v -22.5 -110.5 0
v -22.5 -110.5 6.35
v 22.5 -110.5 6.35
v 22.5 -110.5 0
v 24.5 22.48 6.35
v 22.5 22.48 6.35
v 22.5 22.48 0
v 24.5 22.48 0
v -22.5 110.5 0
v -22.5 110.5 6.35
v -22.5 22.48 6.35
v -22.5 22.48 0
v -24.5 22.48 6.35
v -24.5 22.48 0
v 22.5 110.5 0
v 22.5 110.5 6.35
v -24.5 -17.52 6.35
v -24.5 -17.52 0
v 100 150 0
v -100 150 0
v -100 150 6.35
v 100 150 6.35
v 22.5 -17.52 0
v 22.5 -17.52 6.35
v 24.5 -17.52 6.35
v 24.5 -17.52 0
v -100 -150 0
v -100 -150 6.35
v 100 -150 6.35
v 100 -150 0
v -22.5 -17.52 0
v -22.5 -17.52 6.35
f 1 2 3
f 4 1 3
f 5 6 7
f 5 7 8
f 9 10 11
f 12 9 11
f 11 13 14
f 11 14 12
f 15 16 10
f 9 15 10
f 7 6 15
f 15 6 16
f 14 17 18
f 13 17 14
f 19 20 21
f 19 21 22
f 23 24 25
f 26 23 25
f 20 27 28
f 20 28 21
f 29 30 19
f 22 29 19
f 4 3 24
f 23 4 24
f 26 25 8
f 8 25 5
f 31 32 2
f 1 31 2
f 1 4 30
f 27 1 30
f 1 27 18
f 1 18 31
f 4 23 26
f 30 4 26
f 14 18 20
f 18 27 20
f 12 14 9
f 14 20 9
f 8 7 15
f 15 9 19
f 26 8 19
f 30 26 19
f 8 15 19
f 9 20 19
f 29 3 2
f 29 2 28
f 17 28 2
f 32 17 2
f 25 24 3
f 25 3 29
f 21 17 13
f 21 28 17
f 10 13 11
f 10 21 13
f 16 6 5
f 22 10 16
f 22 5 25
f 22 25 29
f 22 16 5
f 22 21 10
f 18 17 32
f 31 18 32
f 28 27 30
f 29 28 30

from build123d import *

# Parameters (mm, degrees)
F0_W     = 200
F0_H     = 300
F1_DEPTH = 6.35
F2_W     = 2
F2_H     = 40
F3_DEPTH = 25.4


# Not quite as in the source:
# - a length typed as a fraction of an inch, garbled in the dataset ("3 / 203.2 mm" for 3/8 in), is restored


with BuildPart() as f1:
    # F0 (on Top) → F1 (new body)
    with BuildSketch(Plane.XY):
        Rectangle(F0_W, F0_H)
    extrude(amount=F1_DEPTH)

    # F2 (on face) → F3 (cut)
    with BuildSketch(Plane.XY.offset(6.35)):
        Polygon((22.5, 22.48), (22.5, 110.5), (-22.5, 110.5), (-22.5, 22.48), (-22.5, -17.52), (-22.5, -110.5), (22.5, -110.5), (22.5, -17.52), align=None)
        with Locations((23.5, 2.48)):
            Rectangle(F2_W, F2_H)
        with Locations((-23.5, 2.48)):
            Rectangle(F2_W, F2_H)
    extrude(amount=-F3_DEPTH, mode=Mode.SUBTRACT)


solid = f1.part
